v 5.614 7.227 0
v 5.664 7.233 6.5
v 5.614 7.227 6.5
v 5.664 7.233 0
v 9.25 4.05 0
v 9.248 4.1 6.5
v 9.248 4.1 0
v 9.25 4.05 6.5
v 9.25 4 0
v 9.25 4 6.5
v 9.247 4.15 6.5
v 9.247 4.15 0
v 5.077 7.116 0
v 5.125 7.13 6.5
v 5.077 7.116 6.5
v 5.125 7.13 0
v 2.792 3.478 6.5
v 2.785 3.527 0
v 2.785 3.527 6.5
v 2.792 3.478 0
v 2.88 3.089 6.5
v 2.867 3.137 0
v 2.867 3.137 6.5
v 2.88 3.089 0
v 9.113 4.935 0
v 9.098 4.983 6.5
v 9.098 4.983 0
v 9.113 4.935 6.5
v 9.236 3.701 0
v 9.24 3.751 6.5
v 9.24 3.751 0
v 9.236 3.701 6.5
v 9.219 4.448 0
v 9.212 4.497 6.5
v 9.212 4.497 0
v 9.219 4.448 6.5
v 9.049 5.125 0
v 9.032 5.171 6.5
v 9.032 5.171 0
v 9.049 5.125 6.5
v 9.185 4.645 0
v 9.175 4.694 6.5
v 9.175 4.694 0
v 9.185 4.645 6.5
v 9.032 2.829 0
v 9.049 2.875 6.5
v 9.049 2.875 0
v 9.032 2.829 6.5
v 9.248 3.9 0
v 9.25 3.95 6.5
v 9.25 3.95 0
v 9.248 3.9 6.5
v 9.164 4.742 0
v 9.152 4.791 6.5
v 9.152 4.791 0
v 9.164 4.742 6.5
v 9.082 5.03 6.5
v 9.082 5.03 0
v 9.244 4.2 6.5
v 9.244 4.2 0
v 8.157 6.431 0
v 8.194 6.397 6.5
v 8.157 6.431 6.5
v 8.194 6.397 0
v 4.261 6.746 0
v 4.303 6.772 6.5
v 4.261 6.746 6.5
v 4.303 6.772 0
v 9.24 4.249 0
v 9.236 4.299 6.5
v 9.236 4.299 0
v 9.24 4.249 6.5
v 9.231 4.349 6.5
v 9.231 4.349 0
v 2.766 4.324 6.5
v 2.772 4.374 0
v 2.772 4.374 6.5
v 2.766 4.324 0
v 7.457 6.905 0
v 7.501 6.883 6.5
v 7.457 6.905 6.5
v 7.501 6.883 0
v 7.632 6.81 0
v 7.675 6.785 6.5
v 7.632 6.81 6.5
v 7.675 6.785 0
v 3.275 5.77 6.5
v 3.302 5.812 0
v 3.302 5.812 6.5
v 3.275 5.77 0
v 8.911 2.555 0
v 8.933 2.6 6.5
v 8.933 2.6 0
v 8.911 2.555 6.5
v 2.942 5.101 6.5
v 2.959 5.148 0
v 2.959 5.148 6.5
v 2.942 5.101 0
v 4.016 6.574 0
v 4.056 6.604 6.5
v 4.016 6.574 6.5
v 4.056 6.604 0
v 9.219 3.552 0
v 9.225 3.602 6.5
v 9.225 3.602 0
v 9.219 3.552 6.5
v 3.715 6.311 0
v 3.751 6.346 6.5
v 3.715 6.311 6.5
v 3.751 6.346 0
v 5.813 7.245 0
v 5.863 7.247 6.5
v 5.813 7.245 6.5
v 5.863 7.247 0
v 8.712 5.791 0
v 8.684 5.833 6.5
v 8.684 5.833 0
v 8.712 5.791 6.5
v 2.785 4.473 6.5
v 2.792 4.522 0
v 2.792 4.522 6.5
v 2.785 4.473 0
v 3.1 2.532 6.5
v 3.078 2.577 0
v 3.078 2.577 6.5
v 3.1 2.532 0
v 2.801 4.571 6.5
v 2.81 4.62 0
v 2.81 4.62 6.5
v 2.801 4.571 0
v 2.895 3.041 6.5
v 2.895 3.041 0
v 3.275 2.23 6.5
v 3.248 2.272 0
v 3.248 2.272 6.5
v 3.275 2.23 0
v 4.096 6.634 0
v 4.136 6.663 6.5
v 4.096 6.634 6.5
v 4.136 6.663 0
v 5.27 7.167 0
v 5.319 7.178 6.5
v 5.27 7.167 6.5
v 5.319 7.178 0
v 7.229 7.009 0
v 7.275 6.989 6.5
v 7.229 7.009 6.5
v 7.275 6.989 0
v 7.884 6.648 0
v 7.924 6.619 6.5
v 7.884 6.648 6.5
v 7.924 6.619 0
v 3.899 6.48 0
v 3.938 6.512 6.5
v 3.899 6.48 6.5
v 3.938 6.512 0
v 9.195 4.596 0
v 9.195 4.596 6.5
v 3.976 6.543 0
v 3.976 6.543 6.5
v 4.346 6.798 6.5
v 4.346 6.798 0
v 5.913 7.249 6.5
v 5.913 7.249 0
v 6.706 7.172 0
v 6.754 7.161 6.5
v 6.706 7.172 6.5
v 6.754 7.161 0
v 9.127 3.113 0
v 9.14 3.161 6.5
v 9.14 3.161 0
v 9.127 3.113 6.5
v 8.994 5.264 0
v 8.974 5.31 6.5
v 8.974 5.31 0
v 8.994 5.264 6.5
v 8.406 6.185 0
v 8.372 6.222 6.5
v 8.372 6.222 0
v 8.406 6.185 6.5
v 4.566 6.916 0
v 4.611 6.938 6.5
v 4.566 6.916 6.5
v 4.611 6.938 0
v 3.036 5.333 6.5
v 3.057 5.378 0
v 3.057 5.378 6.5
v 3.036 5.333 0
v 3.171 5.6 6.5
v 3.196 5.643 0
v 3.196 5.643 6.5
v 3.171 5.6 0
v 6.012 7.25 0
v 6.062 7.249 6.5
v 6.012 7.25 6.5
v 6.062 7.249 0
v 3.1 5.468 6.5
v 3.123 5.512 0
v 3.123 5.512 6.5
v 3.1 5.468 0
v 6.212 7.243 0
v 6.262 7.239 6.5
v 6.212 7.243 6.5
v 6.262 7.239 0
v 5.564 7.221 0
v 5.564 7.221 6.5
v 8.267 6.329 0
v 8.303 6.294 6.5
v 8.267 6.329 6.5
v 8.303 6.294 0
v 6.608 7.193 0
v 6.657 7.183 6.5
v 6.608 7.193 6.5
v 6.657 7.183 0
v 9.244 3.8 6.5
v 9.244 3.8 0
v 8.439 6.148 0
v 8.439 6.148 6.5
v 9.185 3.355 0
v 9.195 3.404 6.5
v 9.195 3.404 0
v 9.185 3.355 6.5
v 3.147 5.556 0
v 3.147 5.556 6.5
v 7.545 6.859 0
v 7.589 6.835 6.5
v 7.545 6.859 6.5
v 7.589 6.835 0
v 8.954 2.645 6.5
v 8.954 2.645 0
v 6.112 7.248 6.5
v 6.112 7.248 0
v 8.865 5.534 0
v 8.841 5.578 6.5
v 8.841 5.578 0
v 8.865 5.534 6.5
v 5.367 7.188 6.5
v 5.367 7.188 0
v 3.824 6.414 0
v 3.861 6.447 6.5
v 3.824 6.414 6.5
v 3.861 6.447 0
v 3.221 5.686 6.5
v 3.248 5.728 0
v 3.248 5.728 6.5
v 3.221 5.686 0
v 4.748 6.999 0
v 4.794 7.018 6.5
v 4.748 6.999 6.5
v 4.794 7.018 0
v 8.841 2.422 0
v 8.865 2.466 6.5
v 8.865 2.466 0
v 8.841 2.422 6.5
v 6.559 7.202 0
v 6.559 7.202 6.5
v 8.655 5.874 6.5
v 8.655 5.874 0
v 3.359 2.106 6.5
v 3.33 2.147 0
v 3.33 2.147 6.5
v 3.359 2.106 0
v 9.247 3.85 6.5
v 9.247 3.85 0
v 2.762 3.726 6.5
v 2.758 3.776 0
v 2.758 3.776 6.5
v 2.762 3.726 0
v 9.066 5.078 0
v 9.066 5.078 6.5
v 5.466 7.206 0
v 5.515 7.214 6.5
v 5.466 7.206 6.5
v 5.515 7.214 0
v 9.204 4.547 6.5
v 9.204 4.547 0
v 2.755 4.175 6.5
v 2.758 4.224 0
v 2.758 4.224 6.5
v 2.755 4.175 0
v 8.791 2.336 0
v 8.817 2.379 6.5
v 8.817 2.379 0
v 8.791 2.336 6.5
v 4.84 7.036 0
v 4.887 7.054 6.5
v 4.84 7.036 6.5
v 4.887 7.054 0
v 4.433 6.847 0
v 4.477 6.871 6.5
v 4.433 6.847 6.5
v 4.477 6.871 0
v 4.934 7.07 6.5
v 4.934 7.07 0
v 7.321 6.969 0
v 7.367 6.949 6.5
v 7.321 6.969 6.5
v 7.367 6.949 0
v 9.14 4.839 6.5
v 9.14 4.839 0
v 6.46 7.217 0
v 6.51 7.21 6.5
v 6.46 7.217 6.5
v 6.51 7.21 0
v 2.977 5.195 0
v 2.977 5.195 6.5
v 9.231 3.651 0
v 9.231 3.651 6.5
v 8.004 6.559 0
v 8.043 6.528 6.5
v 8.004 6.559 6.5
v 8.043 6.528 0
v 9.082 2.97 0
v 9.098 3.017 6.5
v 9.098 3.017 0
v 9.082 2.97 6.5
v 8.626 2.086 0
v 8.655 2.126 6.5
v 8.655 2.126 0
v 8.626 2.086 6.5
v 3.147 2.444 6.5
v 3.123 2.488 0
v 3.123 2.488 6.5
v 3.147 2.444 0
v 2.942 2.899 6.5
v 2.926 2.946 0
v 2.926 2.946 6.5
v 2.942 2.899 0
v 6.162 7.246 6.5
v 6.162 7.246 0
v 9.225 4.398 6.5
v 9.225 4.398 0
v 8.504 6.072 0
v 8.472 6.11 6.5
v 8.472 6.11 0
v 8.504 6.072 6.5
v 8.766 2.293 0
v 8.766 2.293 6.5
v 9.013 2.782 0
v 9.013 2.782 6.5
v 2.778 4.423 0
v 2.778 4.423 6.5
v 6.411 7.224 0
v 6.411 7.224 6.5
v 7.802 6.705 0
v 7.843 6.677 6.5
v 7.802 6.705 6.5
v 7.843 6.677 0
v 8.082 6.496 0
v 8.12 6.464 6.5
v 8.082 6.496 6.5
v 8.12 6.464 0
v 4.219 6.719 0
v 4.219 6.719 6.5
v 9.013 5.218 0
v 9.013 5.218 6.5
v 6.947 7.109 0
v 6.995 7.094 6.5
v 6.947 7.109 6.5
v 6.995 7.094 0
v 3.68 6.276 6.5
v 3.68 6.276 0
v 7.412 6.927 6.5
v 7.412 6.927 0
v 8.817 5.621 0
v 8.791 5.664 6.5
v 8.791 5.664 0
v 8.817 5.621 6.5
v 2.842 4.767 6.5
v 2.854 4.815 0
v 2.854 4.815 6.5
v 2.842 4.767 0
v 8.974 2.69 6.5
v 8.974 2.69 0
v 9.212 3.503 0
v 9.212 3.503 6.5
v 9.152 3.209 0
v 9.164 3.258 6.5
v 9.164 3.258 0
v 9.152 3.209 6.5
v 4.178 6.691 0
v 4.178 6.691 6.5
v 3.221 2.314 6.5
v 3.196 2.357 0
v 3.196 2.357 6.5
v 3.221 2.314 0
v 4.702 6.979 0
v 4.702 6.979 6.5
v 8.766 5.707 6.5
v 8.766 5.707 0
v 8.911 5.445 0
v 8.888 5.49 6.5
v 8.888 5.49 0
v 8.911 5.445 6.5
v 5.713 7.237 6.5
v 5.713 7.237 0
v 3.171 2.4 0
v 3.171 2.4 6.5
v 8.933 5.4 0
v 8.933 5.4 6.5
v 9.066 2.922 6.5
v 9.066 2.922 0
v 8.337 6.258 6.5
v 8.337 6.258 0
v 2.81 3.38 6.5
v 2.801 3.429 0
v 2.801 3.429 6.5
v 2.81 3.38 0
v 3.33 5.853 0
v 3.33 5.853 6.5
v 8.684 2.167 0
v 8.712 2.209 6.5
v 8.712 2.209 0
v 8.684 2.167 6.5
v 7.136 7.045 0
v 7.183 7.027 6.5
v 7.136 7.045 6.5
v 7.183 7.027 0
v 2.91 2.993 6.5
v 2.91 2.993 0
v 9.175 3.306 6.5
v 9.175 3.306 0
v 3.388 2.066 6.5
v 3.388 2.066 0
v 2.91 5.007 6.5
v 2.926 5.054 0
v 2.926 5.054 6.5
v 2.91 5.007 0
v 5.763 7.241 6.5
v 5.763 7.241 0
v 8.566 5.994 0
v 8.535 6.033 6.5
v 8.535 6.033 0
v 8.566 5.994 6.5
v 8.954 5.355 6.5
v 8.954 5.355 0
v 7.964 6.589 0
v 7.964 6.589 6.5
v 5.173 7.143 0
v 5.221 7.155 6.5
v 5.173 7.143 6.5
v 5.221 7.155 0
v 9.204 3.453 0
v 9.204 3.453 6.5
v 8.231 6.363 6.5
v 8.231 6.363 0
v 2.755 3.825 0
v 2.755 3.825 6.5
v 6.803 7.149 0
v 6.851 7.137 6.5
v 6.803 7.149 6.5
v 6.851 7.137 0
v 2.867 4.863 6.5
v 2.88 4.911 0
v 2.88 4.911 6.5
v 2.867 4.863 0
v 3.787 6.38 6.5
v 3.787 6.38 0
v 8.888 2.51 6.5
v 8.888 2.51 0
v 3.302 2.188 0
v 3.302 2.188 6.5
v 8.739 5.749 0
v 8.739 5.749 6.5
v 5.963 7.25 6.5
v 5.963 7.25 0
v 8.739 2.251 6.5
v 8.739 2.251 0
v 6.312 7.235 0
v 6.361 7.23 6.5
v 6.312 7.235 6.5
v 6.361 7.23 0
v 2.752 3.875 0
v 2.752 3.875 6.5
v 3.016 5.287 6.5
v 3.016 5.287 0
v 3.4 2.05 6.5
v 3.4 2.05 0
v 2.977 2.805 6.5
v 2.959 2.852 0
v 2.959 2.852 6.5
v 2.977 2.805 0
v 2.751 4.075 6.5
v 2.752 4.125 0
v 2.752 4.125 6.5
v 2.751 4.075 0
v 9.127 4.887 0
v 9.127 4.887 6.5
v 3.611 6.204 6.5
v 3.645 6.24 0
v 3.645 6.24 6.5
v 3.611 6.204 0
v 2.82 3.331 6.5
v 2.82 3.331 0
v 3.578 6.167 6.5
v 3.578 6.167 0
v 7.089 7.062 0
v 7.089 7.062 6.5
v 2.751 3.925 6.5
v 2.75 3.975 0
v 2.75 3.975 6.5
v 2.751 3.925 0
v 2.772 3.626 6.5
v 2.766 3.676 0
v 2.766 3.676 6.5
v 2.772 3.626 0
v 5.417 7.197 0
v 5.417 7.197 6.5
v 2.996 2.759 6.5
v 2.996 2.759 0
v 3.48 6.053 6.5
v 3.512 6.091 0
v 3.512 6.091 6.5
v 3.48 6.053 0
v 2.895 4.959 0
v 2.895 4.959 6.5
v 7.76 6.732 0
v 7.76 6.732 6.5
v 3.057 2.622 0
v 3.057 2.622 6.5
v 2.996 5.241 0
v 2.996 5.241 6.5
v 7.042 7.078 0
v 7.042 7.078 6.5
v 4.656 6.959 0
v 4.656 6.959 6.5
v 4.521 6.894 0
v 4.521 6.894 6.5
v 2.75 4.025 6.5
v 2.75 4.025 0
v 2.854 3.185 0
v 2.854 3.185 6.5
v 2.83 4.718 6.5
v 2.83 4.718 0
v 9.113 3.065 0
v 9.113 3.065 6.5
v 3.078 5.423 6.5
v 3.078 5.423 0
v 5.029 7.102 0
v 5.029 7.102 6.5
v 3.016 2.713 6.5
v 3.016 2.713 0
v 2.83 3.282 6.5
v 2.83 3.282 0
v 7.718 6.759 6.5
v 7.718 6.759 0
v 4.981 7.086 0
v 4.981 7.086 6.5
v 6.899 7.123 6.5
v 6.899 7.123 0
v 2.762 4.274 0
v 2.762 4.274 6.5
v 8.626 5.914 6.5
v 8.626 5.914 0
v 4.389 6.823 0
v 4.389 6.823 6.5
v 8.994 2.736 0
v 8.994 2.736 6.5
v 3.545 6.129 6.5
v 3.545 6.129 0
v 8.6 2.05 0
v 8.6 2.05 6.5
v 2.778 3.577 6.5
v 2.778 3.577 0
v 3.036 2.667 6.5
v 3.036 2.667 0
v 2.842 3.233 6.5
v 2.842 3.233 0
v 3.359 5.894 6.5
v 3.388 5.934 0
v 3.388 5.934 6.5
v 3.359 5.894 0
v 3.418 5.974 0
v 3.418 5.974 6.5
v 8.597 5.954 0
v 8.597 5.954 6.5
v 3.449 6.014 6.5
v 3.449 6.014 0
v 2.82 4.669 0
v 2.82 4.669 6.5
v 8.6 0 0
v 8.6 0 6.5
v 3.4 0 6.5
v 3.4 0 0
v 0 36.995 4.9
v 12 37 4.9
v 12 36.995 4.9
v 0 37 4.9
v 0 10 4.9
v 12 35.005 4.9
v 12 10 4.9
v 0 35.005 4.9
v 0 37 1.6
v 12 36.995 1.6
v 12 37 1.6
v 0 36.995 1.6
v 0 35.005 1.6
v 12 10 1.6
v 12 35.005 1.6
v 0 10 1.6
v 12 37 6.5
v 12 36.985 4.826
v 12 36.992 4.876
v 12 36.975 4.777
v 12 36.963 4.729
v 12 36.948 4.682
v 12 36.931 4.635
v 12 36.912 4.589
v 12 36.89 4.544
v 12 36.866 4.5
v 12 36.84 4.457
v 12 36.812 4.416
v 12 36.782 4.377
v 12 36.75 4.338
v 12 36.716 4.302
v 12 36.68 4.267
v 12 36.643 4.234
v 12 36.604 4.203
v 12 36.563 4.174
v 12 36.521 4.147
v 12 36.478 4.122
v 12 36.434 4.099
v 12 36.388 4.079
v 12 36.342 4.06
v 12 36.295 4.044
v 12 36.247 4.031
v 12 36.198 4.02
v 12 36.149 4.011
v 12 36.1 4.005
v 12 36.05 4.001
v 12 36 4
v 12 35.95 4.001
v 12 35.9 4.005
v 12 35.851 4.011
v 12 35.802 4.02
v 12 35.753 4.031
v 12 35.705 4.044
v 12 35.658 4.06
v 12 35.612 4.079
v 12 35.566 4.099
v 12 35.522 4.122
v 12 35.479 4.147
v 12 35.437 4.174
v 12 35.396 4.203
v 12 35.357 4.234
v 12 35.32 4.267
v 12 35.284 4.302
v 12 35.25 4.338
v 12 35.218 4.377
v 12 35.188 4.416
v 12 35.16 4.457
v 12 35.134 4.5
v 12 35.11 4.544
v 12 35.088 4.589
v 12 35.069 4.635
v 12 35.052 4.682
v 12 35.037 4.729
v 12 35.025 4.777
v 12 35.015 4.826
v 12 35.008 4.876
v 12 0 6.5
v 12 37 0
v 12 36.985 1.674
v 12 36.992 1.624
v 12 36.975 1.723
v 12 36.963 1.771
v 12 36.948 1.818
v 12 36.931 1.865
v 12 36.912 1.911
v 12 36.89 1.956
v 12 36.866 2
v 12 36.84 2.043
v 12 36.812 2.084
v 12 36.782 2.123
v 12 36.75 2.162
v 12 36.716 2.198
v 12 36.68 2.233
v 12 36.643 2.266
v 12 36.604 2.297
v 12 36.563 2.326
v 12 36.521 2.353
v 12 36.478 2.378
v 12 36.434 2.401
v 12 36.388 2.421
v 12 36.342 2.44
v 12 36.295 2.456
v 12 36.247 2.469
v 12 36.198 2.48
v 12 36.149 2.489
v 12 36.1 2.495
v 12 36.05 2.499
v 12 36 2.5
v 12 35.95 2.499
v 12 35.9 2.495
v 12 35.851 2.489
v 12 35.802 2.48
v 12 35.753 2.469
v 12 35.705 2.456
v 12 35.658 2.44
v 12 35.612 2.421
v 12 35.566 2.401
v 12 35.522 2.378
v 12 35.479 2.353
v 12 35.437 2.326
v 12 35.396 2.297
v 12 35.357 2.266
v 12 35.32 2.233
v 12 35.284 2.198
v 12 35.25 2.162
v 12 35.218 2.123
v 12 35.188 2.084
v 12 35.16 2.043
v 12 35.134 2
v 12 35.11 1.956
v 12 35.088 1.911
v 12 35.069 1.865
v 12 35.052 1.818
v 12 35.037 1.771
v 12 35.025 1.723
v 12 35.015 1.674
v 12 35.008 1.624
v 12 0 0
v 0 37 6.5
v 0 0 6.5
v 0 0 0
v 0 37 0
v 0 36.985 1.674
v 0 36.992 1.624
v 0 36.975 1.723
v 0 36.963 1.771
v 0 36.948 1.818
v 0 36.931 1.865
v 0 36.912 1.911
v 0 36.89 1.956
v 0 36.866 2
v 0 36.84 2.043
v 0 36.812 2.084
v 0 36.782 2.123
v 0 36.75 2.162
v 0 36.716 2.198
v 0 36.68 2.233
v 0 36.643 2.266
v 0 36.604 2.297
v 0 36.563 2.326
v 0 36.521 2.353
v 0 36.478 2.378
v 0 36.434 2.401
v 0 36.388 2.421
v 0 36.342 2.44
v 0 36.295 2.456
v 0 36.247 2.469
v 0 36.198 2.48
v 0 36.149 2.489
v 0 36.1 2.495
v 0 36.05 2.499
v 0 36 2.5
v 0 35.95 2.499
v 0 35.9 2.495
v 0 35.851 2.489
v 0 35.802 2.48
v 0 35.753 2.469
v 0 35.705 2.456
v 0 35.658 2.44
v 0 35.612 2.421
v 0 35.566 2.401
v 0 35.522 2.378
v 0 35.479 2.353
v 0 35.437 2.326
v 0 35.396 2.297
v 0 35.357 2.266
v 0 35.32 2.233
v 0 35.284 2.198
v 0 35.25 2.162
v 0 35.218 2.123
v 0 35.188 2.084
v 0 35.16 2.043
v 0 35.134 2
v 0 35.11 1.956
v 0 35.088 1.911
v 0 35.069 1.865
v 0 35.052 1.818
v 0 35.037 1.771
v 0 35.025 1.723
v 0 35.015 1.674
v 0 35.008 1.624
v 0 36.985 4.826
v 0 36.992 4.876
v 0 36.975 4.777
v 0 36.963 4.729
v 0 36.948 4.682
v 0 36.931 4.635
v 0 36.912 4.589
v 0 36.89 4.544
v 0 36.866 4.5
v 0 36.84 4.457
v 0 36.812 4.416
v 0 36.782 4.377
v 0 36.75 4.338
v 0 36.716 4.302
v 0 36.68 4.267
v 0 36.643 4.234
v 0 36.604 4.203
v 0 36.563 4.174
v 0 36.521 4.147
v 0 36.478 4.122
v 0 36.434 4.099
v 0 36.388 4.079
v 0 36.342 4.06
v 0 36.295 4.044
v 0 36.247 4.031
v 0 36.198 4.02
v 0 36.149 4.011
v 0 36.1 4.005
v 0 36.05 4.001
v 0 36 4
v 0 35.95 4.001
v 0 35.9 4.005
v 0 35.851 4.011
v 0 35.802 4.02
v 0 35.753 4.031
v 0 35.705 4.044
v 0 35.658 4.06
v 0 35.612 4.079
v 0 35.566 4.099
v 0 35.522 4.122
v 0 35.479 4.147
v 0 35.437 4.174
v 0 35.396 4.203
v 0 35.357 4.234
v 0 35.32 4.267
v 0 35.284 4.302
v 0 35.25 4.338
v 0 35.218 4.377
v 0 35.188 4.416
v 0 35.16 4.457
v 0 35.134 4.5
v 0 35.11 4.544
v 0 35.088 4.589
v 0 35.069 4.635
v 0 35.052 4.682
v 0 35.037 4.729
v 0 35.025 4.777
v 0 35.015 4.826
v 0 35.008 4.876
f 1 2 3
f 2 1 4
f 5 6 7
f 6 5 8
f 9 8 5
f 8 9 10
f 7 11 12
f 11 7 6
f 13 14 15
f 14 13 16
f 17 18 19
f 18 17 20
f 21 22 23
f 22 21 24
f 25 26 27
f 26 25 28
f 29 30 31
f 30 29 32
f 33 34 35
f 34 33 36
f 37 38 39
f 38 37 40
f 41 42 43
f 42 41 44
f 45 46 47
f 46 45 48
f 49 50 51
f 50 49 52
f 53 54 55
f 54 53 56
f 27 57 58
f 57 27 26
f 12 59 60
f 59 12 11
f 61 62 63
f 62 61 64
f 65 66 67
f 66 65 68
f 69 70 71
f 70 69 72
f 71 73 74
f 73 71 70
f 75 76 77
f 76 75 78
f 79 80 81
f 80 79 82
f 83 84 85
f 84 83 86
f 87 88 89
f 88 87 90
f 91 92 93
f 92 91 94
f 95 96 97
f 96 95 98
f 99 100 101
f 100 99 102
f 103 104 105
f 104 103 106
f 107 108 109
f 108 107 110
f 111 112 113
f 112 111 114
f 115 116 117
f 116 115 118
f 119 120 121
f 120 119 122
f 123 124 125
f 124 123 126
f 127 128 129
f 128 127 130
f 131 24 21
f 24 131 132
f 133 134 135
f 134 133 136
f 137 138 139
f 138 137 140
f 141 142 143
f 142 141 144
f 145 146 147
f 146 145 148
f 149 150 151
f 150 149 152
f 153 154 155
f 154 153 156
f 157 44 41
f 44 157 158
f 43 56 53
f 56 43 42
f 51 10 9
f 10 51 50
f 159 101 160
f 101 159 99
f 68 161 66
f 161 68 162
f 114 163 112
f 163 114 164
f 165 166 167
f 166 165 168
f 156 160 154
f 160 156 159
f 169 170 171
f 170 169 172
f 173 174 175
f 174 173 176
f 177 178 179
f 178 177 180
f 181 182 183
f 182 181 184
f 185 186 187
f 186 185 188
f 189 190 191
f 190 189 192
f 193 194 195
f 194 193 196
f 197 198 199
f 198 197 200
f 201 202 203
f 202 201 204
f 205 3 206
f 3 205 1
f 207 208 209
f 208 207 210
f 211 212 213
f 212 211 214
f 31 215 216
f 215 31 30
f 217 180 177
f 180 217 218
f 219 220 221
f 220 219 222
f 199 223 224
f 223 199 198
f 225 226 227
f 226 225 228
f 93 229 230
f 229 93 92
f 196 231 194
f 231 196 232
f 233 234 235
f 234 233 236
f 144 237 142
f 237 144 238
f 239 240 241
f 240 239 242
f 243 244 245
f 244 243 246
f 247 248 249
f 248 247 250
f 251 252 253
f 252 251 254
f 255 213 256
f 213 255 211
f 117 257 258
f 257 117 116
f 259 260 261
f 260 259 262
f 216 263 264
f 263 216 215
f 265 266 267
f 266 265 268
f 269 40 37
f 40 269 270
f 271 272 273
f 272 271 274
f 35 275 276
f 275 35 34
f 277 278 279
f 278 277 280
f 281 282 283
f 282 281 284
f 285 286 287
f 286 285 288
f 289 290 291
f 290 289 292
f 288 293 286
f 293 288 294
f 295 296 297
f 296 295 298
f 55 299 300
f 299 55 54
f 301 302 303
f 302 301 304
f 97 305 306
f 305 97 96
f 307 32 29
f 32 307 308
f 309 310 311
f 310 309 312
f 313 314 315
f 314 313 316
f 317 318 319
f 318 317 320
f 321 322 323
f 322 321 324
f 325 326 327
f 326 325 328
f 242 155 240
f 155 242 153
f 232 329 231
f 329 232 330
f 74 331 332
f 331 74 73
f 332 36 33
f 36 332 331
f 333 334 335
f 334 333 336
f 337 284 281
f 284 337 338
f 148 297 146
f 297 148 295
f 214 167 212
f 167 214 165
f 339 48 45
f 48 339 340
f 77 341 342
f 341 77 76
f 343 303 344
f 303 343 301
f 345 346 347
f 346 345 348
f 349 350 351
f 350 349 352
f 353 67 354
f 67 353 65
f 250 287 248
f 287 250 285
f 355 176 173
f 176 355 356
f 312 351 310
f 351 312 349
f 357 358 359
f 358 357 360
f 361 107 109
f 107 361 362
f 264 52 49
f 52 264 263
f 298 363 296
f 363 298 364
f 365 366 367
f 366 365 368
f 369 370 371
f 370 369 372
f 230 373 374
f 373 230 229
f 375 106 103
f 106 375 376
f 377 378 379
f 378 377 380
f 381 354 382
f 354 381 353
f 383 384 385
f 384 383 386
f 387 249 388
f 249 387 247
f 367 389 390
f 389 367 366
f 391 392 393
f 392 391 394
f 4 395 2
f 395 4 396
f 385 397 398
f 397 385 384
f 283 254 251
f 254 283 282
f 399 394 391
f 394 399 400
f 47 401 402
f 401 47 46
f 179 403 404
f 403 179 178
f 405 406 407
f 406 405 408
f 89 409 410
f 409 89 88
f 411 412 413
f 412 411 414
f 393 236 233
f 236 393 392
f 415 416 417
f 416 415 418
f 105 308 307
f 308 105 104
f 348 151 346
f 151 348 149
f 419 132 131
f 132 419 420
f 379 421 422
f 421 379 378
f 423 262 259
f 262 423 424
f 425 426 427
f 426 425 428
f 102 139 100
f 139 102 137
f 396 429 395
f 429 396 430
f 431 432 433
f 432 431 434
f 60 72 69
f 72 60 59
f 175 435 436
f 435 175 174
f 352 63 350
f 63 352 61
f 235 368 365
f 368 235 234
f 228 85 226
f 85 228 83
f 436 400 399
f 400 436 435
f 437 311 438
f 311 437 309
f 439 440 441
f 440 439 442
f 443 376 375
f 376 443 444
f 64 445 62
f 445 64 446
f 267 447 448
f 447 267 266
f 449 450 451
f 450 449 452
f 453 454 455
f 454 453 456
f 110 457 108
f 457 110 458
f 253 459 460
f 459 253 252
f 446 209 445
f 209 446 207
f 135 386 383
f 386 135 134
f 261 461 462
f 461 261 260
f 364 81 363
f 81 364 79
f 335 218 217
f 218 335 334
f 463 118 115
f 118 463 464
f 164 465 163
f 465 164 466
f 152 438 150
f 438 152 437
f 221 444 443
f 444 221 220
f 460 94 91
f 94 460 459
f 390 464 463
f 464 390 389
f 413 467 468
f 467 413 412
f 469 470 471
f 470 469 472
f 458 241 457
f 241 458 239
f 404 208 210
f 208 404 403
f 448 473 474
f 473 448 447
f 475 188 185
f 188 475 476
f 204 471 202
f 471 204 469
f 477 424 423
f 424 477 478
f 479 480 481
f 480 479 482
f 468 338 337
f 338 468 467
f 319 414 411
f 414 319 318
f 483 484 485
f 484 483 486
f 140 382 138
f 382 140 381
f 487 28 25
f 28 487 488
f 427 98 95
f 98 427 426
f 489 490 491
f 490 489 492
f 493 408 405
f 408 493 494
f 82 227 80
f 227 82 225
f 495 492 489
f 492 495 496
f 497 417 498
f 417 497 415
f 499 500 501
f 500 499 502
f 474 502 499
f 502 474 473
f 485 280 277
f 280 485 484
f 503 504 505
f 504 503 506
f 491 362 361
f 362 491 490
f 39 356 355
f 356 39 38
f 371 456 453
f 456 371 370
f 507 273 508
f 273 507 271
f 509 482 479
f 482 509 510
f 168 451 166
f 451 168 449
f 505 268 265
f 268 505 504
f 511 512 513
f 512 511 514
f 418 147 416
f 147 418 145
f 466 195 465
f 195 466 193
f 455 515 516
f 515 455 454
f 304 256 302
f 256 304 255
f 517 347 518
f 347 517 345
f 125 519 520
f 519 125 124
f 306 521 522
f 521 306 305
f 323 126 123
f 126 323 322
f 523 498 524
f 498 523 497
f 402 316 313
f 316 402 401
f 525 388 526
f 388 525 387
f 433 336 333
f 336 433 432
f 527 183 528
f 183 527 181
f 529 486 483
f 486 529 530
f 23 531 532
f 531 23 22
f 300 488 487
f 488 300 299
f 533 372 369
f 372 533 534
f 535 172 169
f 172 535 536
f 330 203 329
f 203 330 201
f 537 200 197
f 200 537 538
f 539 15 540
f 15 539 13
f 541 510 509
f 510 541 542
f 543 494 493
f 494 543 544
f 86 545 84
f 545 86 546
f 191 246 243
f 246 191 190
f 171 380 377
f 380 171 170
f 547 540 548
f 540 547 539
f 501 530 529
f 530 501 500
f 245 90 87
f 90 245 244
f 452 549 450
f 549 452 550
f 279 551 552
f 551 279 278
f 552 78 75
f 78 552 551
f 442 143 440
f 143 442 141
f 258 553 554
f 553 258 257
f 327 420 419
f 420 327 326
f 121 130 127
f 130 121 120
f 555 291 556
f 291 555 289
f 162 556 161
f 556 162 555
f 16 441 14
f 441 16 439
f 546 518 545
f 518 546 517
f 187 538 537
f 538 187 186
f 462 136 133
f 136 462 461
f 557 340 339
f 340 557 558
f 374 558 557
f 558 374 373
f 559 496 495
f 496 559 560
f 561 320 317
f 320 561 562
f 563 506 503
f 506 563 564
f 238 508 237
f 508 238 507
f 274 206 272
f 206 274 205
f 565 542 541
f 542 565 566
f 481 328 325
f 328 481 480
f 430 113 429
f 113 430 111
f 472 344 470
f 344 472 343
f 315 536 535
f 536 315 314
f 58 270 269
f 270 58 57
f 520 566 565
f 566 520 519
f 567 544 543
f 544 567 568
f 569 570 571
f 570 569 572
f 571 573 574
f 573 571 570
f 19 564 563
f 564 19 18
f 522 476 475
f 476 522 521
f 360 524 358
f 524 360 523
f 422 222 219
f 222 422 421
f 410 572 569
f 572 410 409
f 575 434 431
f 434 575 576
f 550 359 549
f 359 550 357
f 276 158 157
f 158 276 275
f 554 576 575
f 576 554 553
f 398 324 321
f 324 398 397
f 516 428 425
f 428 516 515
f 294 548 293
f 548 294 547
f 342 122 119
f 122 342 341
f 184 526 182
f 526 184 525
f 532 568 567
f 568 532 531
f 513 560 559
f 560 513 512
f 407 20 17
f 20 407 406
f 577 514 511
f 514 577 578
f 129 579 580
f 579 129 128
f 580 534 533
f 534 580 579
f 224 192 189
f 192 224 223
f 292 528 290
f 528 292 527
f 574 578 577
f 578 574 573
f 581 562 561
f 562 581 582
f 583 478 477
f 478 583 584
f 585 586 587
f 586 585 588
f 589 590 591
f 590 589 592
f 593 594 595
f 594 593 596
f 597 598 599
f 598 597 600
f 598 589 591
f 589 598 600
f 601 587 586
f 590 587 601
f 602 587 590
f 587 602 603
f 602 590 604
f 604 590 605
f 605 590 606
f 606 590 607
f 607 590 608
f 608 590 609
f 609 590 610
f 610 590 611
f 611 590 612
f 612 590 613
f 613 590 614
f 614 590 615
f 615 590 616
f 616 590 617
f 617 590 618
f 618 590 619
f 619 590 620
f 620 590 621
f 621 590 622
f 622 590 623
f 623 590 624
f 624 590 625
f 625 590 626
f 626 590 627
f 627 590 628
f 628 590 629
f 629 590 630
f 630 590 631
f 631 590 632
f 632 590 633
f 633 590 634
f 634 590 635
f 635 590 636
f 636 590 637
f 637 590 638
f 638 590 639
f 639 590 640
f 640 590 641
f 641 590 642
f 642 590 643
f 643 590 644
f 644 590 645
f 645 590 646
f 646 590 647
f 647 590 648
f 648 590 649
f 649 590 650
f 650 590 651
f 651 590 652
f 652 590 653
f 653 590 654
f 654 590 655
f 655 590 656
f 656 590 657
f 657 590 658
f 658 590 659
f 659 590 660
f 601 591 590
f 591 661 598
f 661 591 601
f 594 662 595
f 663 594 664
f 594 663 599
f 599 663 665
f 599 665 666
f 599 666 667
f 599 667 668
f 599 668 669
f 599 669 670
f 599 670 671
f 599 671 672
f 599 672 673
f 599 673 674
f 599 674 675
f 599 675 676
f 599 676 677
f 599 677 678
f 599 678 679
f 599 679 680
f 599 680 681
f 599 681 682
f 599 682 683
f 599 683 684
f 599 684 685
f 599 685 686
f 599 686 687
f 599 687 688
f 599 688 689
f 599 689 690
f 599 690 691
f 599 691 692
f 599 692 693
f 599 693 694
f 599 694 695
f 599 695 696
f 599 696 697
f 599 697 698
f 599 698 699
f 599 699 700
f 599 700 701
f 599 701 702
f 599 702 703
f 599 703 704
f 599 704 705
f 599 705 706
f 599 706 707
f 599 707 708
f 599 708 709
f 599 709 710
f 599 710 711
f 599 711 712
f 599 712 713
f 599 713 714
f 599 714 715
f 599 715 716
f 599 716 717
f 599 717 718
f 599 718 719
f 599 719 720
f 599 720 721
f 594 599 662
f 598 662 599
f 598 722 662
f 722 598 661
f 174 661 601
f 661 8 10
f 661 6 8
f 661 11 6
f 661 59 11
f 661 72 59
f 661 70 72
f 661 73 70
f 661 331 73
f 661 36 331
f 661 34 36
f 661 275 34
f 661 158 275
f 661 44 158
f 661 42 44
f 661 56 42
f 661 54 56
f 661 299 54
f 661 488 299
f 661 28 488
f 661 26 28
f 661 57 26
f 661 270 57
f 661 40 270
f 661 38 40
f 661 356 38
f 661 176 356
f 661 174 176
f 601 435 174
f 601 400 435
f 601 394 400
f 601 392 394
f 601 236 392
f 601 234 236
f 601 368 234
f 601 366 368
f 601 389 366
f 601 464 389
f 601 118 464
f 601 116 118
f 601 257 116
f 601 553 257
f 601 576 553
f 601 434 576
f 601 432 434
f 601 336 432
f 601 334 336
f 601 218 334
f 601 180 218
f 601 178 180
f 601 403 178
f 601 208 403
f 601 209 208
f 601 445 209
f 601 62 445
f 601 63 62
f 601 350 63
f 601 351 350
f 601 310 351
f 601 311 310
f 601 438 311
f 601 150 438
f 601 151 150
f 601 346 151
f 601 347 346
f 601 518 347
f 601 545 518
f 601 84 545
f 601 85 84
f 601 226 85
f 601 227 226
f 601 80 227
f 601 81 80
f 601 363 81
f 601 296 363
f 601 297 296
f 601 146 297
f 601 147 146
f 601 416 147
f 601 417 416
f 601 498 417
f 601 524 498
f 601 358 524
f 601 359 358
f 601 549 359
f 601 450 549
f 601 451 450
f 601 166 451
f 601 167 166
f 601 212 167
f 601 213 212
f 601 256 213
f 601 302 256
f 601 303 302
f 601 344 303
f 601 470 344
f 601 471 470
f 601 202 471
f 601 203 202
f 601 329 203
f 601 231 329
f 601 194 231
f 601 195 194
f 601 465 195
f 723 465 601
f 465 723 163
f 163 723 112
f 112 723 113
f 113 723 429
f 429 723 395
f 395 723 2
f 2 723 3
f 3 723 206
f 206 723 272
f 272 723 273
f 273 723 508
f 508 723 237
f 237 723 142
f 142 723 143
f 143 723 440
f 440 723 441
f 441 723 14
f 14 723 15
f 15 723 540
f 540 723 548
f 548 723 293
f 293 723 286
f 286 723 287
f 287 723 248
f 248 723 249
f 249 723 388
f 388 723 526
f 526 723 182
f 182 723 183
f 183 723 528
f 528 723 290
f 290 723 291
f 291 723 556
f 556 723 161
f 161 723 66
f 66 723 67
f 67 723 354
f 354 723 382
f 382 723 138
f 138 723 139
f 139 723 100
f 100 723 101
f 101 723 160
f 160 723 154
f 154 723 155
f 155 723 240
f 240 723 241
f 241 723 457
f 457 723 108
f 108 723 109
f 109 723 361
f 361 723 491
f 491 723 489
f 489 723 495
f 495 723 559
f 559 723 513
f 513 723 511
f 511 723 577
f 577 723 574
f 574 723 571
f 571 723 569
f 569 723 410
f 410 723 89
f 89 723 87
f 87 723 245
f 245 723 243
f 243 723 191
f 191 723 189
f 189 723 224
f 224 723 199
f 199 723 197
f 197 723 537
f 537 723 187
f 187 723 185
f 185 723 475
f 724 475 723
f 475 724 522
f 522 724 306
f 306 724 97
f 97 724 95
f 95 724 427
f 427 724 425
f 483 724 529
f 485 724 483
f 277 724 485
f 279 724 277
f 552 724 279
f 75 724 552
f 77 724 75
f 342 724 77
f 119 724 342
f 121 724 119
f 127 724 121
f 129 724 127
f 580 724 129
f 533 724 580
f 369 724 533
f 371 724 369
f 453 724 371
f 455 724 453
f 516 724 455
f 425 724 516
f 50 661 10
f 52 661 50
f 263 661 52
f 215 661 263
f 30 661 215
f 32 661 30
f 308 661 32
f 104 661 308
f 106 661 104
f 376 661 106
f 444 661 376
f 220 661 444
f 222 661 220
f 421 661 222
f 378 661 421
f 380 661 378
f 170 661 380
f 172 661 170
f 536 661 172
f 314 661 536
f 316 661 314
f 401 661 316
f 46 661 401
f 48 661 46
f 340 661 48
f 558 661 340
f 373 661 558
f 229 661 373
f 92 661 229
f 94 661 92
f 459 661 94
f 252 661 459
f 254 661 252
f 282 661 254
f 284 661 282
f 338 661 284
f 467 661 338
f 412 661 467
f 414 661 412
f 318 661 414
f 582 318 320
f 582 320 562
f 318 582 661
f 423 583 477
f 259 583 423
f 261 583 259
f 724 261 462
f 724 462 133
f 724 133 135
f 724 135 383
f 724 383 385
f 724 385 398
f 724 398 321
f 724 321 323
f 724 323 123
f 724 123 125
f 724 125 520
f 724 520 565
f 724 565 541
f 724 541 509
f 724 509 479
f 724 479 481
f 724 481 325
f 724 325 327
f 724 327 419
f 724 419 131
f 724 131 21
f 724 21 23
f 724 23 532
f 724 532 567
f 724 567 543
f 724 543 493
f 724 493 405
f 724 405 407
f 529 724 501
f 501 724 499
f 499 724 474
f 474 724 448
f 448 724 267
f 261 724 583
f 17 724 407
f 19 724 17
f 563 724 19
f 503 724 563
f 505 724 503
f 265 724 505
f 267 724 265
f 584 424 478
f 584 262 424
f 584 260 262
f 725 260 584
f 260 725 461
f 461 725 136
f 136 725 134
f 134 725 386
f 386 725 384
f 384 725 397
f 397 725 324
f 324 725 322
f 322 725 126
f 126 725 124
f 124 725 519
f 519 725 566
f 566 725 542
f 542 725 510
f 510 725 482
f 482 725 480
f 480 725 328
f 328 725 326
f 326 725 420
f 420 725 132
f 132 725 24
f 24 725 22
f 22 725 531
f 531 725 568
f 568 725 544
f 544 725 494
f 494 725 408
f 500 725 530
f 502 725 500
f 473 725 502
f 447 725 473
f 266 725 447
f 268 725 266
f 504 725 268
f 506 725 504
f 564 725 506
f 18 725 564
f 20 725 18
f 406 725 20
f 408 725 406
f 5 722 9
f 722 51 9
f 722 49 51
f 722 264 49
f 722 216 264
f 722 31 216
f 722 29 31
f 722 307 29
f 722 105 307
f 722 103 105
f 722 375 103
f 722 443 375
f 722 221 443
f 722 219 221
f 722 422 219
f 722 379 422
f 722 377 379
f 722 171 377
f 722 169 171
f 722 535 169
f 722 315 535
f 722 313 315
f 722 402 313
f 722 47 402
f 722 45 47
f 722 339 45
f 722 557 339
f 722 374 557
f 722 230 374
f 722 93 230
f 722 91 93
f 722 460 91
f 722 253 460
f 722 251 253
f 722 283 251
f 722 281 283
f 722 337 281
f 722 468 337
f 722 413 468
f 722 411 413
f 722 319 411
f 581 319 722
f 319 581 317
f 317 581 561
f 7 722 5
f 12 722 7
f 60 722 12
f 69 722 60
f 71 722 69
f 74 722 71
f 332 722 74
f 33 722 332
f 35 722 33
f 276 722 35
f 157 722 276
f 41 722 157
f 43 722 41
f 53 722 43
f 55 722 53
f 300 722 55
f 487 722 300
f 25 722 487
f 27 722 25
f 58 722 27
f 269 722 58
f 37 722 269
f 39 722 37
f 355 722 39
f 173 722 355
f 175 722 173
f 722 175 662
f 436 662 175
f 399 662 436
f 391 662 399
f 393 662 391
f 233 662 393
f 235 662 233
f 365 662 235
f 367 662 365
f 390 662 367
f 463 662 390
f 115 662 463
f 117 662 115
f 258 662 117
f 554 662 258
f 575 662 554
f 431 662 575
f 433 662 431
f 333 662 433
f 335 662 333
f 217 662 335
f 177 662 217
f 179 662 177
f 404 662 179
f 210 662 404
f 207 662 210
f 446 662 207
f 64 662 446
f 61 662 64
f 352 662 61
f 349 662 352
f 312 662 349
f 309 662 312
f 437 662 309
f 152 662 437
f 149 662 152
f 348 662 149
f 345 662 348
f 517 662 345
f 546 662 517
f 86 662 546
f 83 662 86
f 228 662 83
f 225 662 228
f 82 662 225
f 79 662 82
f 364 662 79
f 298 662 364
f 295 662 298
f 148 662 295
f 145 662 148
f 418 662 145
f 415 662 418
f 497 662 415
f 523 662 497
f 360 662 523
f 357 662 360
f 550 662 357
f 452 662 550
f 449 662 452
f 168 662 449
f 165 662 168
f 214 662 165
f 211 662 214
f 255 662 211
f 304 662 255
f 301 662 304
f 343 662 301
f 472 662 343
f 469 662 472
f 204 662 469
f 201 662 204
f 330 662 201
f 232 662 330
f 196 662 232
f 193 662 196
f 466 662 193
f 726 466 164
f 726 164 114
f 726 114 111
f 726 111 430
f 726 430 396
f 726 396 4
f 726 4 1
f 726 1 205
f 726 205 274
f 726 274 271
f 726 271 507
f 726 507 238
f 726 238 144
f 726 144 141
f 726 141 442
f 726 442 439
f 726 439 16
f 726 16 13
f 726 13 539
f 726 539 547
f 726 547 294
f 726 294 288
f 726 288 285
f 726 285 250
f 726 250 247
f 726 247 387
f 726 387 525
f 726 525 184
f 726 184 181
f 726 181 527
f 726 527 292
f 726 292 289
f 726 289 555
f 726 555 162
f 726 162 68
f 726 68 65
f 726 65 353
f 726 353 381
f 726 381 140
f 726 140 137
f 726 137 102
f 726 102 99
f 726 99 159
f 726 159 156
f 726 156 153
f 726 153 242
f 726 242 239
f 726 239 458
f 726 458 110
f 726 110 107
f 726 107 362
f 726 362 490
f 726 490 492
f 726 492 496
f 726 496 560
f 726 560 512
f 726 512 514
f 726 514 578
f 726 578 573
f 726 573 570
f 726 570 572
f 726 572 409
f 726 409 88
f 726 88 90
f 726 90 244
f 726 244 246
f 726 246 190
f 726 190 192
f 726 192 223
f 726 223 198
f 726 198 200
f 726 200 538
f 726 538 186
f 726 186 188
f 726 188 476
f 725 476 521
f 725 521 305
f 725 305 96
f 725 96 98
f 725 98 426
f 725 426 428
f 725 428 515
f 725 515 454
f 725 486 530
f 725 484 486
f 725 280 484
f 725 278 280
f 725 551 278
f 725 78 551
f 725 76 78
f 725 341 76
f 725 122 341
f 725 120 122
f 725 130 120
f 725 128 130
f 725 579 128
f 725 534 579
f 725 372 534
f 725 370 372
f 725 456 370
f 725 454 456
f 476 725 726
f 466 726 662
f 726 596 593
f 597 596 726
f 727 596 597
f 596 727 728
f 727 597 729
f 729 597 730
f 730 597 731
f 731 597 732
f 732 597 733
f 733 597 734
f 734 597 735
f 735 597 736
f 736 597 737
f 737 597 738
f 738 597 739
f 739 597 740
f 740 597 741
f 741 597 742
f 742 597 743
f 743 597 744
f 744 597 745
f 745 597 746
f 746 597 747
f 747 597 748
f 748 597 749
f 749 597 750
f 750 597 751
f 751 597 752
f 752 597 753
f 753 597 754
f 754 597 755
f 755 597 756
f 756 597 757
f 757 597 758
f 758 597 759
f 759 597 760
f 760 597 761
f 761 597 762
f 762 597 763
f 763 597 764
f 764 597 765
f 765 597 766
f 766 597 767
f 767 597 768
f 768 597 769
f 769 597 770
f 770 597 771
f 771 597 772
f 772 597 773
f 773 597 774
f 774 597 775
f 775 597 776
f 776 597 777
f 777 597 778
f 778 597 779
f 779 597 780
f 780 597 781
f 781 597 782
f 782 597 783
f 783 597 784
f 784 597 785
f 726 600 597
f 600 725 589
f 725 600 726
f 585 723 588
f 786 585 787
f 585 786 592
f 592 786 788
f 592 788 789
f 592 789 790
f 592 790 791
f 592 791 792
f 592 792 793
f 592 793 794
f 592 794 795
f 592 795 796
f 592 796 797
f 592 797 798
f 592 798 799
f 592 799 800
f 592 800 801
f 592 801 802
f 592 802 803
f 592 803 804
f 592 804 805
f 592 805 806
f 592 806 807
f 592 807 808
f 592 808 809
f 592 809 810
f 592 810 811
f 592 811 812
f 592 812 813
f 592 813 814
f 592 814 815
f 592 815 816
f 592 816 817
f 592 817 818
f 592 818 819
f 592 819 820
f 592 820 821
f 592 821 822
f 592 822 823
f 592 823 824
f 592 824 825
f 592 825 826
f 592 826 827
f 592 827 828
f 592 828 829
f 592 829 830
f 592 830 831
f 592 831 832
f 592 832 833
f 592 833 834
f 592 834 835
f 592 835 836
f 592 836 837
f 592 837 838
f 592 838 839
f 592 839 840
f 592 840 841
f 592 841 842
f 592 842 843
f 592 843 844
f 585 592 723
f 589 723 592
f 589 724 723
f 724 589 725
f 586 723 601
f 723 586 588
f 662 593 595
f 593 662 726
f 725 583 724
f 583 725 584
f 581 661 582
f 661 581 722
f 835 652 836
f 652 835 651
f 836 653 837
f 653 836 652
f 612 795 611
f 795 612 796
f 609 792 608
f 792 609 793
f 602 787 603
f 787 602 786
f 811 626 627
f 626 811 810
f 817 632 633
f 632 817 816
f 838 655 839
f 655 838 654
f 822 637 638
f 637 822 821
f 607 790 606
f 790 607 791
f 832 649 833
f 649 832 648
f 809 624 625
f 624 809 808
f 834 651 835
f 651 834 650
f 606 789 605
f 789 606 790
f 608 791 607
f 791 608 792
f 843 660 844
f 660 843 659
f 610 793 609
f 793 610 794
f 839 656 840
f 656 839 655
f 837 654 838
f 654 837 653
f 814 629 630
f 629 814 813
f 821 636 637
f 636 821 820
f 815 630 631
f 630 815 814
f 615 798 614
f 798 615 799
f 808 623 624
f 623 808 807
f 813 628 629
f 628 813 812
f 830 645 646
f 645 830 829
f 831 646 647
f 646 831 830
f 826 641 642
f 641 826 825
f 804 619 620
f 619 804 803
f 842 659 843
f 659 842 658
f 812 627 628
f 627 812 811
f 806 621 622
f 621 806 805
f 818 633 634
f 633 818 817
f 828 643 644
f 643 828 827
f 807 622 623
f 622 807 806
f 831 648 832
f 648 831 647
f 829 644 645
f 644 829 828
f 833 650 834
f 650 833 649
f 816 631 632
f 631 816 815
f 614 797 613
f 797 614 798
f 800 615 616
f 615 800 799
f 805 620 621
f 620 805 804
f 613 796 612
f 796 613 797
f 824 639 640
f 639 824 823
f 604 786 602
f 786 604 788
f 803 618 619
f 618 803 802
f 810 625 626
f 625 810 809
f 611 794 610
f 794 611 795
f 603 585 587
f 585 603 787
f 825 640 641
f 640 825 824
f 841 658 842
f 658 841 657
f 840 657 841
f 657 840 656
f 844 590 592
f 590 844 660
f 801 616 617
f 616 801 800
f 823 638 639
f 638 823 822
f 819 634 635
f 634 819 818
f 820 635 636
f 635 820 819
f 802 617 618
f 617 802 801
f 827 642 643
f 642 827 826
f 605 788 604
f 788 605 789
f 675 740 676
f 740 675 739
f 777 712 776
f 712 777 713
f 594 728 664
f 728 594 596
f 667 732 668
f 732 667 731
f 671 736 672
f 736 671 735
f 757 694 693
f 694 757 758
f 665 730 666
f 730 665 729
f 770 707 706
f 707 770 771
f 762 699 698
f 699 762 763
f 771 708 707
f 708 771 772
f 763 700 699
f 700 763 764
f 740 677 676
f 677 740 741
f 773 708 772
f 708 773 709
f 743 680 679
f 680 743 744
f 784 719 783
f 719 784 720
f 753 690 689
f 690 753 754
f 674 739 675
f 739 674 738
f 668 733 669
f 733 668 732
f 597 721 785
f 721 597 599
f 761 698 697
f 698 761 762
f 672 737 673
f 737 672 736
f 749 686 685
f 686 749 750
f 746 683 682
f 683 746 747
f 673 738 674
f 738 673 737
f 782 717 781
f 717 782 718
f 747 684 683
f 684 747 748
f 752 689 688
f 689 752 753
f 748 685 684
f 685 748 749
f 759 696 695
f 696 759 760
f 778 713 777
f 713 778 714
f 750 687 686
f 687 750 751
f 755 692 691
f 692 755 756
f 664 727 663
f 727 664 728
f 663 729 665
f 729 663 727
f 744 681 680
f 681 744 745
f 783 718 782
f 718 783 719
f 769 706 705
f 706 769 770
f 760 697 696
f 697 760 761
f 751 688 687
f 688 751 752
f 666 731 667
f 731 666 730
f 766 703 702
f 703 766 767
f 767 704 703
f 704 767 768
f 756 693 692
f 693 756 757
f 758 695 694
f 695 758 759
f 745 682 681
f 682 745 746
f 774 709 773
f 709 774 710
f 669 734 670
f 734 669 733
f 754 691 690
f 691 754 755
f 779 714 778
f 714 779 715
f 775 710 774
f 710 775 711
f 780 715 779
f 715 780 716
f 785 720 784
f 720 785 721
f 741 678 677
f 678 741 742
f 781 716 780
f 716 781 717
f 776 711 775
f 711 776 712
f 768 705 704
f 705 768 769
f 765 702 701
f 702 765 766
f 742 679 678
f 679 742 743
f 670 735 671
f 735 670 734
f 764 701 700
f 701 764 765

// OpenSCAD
$fa=0.5; // default minimum facet angle is now 0.5
$fs=0.05; // default minimum facet size is now 0.05 mm

difference() {
  union() {
    cube([12, 37, 6.5]);
  }
  union() {
    translate([6, 4, -.1]) cylinder(r=3.25, h=13);
    translate([3.4, -.1, -.1]) cube([5.2, 3, 13]);
    translate([-.1, 10, 1.6]) cube([12.2, 27.5, 3.3]);
  }
}

    translate([0, 36, 5]) rotate([0, 90, 0]) cylinder(r=1, h=12);
    translate([0, 36, 1.5]) rotate([0, 90, 0]) cylinder(r=1, h=12);
